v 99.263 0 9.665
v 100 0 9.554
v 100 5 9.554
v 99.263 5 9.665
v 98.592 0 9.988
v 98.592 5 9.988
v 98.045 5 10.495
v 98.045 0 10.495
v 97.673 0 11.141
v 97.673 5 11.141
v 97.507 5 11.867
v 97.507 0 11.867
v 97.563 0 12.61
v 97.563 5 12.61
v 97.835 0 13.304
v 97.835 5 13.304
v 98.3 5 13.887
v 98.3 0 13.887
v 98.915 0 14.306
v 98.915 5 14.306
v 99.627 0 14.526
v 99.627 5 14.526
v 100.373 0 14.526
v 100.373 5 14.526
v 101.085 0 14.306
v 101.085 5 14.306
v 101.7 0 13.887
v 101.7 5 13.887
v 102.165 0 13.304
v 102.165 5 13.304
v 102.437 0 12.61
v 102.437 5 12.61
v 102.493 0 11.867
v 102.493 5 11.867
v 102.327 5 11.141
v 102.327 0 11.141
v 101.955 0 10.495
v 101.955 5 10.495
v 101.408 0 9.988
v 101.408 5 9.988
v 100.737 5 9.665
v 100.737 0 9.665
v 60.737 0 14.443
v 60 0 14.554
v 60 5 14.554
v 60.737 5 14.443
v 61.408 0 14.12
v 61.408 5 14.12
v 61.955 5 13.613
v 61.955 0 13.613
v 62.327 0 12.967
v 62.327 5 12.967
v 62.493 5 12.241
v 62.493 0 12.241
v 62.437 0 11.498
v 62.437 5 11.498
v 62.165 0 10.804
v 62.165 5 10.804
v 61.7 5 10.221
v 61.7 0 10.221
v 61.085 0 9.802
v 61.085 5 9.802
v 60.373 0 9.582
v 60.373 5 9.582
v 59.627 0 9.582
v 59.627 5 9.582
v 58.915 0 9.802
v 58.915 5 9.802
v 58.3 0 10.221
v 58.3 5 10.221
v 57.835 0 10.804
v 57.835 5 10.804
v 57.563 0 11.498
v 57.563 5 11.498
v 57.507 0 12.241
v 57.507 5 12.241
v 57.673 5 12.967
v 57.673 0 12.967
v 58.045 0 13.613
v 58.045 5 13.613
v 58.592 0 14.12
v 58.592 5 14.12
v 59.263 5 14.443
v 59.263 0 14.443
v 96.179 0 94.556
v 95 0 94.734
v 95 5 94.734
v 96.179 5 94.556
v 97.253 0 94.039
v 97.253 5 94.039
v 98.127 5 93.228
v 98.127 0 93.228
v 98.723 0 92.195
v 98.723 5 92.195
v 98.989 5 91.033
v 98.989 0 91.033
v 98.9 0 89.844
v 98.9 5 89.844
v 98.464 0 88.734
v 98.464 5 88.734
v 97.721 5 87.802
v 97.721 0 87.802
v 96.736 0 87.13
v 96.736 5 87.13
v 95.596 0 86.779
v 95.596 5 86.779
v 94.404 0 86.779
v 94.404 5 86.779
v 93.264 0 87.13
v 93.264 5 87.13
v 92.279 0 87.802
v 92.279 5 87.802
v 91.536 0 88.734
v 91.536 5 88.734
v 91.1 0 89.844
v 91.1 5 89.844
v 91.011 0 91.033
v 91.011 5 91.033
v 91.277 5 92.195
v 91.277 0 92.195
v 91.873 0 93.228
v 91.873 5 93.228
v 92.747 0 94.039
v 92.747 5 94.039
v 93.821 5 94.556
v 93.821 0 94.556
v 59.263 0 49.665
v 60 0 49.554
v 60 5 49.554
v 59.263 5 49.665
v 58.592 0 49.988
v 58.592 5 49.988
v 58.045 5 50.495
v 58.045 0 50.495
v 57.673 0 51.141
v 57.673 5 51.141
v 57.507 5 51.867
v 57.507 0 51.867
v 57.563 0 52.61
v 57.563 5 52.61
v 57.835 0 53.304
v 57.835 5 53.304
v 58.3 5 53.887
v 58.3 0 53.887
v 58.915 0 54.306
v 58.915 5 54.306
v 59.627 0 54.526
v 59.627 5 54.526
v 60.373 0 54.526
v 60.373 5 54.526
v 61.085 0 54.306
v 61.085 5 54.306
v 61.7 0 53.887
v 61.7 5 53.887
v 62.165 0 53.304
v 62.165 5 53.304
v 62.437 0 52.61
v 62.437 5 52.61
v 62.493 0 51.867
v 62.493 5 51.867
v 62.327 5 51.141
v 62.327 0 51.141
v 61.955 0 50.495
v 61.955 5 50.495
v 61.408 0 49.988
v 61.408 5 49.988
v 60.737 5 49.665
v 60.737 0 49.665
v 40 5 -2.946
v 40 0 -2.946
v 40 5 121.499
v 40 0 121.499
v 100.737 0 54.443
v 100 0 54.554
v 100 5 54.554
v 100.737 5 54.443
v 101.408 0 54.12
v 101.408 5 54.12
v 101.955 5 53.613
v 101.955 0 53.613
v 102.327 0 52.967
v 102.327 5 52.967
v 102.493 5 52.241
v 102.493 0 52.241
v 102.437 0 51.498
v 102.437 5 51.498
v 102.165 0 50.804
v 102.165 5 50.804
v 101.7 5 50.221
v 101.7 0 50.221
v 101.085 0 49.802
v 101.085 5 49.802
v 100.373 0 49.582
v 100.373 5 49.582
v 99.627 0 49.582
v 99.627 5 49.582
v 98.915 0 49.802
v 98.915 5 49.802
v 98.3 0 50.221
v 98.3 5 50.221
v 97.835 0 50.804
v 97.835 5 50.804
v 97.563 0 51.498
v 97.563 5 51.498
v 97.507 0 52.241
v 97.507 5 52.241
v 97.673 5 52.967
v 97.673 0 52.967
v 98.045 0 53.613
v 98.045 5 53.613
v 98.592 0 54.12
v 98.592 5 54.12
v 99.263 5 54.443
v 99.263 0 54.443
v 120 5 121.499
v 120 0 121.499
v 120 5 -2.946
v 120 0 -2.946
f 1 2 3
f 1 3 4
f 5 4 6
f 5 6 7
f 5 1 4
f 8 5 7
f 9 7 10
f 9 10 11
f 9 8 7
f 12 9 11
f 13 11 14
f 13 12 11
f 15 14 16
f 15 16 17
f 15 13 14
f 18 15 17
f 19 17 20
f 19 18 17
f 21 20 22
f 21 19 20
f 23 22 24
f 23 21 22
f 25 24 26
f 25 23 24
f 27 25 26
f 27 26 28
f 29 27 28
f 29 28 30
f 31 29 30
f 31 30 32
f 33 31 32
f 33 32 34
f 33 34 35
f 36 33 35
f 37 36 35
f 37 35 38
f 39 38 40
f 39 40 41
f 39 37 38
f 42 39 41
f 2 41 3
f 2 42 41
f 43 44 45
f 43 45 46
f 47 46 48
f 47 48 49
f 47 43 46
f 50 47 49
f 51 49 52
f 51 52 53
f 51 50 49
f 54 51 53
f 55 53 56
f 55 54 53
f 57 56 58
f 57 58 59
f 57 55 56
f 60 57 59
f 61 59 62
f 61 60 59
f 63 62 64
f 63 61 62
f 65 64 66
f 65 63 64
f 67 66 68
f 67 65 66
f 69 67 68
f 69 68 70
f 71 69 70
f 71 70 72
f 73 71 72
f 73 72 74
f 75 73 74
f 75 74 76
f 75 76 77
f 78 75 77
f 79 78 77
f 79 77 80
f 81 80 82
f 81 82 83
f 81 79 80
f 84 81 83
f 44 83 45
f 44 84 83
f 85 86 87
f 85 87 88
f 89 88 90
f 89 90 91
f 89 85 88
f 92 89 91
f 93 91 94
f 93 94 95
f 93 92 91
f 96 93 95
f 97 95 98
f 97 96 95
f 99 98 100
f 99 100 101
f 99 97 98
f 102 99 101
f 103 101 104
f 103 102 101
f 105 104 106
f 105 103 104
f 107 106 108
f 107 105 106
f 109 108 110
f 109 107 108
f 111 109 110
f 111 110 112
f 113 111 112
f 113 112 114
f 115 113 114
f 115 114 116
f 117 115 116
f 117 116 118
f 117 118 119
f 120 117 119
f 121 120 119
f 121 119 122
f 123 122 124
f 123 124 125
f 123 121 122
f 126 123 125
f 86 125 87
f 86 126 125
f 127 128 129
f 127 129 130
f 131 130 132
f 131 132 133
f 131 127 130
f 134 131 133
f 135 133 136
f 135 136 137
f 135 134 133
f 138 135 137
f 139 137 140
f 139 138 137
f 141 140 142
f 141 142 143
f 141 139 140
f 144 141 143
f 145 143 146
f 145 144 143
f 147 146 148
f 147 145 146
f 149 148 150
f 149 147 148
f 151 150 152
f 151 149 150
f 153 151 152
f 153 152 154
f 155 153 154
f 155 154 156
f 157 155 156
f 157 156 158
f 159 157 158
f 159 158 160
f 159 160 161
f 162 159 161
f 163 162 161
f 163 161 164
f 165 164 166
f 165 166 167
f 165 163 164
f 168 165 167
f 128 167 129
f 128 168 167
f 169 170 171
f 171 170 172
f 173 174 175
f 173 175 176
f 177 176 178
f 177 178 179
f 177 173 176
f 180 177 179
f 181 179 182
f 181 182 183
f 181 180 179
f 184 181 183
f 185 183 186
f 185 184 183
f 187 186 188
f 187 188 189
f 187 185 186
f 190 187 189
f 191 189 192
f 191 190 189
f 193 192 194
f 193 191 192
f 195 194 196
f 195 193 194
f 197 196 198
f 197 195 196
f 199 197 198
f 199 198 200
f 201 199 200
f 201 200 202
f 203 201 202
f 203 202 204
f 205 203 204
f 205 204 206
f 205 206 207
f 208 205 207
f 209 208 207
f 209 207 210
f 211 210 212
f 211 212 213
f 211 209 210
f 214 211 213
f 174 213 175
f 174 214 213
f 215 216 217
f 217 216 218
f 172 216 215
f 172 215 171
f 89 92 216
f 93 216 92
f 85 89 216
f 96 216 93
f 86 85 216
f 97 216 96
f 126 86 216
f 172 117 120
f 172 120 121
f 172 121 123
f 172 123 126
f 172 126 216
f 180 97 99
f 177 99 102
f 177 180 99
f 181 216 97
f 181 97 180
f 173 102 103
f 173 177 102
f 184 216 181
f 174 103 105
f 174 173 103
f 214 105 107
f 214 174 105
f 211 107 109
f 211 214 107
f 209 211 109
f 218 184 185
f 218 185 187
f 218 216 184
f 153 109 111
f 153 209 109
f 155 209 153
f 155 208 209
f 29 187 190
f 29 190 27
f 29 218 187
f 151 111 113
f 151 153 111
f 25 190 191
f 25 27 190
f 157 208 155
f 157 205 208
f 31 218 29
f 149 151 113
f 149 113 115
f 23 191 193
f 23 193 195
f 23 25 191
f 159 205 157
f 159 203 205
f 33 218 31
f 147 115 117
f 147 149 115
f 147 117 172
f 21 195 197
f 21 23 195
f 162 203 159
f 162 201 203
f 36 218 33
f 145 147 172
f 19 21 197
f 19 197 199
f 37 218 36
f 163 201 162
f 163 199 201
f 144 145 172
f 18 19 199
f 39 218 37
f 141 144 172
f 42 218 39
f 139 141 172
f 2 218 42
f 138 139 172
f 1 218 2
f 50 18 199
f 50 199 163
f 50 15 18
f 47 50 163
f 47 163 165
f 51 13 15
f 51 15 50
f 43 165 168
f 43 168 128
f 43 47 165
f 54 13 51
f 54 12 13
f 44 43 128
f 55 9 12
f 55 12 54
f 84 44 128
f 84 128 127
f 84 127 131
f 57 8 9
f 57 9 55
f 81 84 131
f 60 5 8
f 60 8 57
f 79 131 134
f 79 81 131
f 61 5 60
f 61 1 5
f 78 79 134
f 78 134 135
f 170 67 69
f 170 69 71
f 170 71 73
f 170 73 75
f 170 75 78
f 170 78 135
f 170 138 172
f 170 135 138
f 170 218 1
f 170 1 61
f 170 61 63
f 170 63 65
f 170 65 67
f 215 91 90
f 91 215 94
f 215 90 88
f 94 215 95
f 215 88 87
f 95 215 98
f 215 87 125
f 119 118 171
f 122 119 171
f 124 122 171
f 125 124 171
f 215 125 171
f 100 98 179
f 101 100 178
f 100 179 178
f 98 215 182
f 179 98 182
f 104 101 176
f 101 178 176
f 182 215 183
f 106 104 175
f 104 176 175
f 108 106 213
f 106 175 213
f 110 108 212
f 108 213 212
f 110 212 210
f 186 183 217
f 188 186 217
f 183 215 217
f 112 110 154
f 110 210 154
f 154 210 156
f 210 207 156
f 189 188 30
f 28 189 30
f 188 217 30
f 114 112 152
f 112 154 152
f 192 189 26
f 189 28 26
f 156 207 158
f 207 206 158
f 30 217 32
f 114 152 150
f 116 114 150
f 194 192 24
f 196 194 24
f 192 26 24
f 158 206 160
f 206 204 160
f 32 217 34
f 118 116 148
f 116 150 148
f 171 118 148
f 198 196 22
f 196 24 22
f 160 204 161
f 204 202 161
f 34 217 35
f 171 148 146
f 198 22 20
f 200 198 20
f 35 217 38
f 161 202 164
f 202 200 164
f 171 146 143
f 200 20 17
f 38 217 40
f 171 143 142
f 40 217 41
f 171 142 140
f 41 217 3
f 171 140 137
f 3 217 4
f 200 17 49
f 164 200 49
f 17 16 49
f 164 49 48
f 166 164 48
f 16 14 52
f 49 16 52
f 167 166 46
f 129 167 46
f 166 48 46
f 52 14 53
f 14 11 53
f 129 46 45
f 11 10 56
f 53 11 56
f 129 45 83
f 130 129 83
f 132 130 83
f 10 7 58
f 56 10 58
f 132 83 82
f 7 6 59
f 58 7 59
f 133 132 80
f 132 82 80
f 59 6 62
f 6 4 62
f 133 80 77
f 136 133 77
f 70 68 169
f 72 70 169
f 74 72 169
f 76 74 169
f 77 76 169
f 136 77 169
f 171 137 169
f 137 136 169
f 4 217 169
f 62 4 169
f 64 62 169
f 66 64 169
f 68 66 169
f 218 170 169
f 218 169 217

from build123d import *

# Parameters (mm, degrees)
SKETCH1_R           = 2.5
SKETCH1_R_2         = 4
BOSS_EXTRUDE1_DEPTH = 5


with BuildPart() as part:
    # Sketch1 → Boss-Extrude1 (new body)
    with BuildSketch(Plane(origin=(0, 0, 0), x_dir=(1, 0, 0), z_dir=(0, 1, 0))):
        Polygon((40, 2.94599018), (120, 2.94599018), (120, -67.05400982), (120, -121.498685507), (40, -121.498685507), (40, -67.05400982), align=None)
        with Locations(Location((60, -12.05400982, 0), (0, 0, 270))):
            Circle(SKETCH1_R, mode=Mode.SUBTRACT)
        with Locations(Location((60, -52.05400982, 0), (0, 0, 90))):
            Circle(SKETCH1_R, mode=Mode.SUBTRACT)
        with Locations(Location((100, -52.05400982, 0), (0, 0, 270))):
            Circle(SKETCH1_R, mode=Mode.SUBTRACT)
        with Locations(Location((100, -12.05400982, 0), (0, 0, 90))):
            Circle(SKETCH1_R, mode=Mode.SUBTRACT)
        with Locations(Location((95, -90.734036345, 0), (0, 0, 270))):
            Circle(SKETCH1_R_2, mode=Mode.SUBTRACT)
    extrude(amount=BOSS_EXTRUDE1_DEPTH)


solid = part.part
